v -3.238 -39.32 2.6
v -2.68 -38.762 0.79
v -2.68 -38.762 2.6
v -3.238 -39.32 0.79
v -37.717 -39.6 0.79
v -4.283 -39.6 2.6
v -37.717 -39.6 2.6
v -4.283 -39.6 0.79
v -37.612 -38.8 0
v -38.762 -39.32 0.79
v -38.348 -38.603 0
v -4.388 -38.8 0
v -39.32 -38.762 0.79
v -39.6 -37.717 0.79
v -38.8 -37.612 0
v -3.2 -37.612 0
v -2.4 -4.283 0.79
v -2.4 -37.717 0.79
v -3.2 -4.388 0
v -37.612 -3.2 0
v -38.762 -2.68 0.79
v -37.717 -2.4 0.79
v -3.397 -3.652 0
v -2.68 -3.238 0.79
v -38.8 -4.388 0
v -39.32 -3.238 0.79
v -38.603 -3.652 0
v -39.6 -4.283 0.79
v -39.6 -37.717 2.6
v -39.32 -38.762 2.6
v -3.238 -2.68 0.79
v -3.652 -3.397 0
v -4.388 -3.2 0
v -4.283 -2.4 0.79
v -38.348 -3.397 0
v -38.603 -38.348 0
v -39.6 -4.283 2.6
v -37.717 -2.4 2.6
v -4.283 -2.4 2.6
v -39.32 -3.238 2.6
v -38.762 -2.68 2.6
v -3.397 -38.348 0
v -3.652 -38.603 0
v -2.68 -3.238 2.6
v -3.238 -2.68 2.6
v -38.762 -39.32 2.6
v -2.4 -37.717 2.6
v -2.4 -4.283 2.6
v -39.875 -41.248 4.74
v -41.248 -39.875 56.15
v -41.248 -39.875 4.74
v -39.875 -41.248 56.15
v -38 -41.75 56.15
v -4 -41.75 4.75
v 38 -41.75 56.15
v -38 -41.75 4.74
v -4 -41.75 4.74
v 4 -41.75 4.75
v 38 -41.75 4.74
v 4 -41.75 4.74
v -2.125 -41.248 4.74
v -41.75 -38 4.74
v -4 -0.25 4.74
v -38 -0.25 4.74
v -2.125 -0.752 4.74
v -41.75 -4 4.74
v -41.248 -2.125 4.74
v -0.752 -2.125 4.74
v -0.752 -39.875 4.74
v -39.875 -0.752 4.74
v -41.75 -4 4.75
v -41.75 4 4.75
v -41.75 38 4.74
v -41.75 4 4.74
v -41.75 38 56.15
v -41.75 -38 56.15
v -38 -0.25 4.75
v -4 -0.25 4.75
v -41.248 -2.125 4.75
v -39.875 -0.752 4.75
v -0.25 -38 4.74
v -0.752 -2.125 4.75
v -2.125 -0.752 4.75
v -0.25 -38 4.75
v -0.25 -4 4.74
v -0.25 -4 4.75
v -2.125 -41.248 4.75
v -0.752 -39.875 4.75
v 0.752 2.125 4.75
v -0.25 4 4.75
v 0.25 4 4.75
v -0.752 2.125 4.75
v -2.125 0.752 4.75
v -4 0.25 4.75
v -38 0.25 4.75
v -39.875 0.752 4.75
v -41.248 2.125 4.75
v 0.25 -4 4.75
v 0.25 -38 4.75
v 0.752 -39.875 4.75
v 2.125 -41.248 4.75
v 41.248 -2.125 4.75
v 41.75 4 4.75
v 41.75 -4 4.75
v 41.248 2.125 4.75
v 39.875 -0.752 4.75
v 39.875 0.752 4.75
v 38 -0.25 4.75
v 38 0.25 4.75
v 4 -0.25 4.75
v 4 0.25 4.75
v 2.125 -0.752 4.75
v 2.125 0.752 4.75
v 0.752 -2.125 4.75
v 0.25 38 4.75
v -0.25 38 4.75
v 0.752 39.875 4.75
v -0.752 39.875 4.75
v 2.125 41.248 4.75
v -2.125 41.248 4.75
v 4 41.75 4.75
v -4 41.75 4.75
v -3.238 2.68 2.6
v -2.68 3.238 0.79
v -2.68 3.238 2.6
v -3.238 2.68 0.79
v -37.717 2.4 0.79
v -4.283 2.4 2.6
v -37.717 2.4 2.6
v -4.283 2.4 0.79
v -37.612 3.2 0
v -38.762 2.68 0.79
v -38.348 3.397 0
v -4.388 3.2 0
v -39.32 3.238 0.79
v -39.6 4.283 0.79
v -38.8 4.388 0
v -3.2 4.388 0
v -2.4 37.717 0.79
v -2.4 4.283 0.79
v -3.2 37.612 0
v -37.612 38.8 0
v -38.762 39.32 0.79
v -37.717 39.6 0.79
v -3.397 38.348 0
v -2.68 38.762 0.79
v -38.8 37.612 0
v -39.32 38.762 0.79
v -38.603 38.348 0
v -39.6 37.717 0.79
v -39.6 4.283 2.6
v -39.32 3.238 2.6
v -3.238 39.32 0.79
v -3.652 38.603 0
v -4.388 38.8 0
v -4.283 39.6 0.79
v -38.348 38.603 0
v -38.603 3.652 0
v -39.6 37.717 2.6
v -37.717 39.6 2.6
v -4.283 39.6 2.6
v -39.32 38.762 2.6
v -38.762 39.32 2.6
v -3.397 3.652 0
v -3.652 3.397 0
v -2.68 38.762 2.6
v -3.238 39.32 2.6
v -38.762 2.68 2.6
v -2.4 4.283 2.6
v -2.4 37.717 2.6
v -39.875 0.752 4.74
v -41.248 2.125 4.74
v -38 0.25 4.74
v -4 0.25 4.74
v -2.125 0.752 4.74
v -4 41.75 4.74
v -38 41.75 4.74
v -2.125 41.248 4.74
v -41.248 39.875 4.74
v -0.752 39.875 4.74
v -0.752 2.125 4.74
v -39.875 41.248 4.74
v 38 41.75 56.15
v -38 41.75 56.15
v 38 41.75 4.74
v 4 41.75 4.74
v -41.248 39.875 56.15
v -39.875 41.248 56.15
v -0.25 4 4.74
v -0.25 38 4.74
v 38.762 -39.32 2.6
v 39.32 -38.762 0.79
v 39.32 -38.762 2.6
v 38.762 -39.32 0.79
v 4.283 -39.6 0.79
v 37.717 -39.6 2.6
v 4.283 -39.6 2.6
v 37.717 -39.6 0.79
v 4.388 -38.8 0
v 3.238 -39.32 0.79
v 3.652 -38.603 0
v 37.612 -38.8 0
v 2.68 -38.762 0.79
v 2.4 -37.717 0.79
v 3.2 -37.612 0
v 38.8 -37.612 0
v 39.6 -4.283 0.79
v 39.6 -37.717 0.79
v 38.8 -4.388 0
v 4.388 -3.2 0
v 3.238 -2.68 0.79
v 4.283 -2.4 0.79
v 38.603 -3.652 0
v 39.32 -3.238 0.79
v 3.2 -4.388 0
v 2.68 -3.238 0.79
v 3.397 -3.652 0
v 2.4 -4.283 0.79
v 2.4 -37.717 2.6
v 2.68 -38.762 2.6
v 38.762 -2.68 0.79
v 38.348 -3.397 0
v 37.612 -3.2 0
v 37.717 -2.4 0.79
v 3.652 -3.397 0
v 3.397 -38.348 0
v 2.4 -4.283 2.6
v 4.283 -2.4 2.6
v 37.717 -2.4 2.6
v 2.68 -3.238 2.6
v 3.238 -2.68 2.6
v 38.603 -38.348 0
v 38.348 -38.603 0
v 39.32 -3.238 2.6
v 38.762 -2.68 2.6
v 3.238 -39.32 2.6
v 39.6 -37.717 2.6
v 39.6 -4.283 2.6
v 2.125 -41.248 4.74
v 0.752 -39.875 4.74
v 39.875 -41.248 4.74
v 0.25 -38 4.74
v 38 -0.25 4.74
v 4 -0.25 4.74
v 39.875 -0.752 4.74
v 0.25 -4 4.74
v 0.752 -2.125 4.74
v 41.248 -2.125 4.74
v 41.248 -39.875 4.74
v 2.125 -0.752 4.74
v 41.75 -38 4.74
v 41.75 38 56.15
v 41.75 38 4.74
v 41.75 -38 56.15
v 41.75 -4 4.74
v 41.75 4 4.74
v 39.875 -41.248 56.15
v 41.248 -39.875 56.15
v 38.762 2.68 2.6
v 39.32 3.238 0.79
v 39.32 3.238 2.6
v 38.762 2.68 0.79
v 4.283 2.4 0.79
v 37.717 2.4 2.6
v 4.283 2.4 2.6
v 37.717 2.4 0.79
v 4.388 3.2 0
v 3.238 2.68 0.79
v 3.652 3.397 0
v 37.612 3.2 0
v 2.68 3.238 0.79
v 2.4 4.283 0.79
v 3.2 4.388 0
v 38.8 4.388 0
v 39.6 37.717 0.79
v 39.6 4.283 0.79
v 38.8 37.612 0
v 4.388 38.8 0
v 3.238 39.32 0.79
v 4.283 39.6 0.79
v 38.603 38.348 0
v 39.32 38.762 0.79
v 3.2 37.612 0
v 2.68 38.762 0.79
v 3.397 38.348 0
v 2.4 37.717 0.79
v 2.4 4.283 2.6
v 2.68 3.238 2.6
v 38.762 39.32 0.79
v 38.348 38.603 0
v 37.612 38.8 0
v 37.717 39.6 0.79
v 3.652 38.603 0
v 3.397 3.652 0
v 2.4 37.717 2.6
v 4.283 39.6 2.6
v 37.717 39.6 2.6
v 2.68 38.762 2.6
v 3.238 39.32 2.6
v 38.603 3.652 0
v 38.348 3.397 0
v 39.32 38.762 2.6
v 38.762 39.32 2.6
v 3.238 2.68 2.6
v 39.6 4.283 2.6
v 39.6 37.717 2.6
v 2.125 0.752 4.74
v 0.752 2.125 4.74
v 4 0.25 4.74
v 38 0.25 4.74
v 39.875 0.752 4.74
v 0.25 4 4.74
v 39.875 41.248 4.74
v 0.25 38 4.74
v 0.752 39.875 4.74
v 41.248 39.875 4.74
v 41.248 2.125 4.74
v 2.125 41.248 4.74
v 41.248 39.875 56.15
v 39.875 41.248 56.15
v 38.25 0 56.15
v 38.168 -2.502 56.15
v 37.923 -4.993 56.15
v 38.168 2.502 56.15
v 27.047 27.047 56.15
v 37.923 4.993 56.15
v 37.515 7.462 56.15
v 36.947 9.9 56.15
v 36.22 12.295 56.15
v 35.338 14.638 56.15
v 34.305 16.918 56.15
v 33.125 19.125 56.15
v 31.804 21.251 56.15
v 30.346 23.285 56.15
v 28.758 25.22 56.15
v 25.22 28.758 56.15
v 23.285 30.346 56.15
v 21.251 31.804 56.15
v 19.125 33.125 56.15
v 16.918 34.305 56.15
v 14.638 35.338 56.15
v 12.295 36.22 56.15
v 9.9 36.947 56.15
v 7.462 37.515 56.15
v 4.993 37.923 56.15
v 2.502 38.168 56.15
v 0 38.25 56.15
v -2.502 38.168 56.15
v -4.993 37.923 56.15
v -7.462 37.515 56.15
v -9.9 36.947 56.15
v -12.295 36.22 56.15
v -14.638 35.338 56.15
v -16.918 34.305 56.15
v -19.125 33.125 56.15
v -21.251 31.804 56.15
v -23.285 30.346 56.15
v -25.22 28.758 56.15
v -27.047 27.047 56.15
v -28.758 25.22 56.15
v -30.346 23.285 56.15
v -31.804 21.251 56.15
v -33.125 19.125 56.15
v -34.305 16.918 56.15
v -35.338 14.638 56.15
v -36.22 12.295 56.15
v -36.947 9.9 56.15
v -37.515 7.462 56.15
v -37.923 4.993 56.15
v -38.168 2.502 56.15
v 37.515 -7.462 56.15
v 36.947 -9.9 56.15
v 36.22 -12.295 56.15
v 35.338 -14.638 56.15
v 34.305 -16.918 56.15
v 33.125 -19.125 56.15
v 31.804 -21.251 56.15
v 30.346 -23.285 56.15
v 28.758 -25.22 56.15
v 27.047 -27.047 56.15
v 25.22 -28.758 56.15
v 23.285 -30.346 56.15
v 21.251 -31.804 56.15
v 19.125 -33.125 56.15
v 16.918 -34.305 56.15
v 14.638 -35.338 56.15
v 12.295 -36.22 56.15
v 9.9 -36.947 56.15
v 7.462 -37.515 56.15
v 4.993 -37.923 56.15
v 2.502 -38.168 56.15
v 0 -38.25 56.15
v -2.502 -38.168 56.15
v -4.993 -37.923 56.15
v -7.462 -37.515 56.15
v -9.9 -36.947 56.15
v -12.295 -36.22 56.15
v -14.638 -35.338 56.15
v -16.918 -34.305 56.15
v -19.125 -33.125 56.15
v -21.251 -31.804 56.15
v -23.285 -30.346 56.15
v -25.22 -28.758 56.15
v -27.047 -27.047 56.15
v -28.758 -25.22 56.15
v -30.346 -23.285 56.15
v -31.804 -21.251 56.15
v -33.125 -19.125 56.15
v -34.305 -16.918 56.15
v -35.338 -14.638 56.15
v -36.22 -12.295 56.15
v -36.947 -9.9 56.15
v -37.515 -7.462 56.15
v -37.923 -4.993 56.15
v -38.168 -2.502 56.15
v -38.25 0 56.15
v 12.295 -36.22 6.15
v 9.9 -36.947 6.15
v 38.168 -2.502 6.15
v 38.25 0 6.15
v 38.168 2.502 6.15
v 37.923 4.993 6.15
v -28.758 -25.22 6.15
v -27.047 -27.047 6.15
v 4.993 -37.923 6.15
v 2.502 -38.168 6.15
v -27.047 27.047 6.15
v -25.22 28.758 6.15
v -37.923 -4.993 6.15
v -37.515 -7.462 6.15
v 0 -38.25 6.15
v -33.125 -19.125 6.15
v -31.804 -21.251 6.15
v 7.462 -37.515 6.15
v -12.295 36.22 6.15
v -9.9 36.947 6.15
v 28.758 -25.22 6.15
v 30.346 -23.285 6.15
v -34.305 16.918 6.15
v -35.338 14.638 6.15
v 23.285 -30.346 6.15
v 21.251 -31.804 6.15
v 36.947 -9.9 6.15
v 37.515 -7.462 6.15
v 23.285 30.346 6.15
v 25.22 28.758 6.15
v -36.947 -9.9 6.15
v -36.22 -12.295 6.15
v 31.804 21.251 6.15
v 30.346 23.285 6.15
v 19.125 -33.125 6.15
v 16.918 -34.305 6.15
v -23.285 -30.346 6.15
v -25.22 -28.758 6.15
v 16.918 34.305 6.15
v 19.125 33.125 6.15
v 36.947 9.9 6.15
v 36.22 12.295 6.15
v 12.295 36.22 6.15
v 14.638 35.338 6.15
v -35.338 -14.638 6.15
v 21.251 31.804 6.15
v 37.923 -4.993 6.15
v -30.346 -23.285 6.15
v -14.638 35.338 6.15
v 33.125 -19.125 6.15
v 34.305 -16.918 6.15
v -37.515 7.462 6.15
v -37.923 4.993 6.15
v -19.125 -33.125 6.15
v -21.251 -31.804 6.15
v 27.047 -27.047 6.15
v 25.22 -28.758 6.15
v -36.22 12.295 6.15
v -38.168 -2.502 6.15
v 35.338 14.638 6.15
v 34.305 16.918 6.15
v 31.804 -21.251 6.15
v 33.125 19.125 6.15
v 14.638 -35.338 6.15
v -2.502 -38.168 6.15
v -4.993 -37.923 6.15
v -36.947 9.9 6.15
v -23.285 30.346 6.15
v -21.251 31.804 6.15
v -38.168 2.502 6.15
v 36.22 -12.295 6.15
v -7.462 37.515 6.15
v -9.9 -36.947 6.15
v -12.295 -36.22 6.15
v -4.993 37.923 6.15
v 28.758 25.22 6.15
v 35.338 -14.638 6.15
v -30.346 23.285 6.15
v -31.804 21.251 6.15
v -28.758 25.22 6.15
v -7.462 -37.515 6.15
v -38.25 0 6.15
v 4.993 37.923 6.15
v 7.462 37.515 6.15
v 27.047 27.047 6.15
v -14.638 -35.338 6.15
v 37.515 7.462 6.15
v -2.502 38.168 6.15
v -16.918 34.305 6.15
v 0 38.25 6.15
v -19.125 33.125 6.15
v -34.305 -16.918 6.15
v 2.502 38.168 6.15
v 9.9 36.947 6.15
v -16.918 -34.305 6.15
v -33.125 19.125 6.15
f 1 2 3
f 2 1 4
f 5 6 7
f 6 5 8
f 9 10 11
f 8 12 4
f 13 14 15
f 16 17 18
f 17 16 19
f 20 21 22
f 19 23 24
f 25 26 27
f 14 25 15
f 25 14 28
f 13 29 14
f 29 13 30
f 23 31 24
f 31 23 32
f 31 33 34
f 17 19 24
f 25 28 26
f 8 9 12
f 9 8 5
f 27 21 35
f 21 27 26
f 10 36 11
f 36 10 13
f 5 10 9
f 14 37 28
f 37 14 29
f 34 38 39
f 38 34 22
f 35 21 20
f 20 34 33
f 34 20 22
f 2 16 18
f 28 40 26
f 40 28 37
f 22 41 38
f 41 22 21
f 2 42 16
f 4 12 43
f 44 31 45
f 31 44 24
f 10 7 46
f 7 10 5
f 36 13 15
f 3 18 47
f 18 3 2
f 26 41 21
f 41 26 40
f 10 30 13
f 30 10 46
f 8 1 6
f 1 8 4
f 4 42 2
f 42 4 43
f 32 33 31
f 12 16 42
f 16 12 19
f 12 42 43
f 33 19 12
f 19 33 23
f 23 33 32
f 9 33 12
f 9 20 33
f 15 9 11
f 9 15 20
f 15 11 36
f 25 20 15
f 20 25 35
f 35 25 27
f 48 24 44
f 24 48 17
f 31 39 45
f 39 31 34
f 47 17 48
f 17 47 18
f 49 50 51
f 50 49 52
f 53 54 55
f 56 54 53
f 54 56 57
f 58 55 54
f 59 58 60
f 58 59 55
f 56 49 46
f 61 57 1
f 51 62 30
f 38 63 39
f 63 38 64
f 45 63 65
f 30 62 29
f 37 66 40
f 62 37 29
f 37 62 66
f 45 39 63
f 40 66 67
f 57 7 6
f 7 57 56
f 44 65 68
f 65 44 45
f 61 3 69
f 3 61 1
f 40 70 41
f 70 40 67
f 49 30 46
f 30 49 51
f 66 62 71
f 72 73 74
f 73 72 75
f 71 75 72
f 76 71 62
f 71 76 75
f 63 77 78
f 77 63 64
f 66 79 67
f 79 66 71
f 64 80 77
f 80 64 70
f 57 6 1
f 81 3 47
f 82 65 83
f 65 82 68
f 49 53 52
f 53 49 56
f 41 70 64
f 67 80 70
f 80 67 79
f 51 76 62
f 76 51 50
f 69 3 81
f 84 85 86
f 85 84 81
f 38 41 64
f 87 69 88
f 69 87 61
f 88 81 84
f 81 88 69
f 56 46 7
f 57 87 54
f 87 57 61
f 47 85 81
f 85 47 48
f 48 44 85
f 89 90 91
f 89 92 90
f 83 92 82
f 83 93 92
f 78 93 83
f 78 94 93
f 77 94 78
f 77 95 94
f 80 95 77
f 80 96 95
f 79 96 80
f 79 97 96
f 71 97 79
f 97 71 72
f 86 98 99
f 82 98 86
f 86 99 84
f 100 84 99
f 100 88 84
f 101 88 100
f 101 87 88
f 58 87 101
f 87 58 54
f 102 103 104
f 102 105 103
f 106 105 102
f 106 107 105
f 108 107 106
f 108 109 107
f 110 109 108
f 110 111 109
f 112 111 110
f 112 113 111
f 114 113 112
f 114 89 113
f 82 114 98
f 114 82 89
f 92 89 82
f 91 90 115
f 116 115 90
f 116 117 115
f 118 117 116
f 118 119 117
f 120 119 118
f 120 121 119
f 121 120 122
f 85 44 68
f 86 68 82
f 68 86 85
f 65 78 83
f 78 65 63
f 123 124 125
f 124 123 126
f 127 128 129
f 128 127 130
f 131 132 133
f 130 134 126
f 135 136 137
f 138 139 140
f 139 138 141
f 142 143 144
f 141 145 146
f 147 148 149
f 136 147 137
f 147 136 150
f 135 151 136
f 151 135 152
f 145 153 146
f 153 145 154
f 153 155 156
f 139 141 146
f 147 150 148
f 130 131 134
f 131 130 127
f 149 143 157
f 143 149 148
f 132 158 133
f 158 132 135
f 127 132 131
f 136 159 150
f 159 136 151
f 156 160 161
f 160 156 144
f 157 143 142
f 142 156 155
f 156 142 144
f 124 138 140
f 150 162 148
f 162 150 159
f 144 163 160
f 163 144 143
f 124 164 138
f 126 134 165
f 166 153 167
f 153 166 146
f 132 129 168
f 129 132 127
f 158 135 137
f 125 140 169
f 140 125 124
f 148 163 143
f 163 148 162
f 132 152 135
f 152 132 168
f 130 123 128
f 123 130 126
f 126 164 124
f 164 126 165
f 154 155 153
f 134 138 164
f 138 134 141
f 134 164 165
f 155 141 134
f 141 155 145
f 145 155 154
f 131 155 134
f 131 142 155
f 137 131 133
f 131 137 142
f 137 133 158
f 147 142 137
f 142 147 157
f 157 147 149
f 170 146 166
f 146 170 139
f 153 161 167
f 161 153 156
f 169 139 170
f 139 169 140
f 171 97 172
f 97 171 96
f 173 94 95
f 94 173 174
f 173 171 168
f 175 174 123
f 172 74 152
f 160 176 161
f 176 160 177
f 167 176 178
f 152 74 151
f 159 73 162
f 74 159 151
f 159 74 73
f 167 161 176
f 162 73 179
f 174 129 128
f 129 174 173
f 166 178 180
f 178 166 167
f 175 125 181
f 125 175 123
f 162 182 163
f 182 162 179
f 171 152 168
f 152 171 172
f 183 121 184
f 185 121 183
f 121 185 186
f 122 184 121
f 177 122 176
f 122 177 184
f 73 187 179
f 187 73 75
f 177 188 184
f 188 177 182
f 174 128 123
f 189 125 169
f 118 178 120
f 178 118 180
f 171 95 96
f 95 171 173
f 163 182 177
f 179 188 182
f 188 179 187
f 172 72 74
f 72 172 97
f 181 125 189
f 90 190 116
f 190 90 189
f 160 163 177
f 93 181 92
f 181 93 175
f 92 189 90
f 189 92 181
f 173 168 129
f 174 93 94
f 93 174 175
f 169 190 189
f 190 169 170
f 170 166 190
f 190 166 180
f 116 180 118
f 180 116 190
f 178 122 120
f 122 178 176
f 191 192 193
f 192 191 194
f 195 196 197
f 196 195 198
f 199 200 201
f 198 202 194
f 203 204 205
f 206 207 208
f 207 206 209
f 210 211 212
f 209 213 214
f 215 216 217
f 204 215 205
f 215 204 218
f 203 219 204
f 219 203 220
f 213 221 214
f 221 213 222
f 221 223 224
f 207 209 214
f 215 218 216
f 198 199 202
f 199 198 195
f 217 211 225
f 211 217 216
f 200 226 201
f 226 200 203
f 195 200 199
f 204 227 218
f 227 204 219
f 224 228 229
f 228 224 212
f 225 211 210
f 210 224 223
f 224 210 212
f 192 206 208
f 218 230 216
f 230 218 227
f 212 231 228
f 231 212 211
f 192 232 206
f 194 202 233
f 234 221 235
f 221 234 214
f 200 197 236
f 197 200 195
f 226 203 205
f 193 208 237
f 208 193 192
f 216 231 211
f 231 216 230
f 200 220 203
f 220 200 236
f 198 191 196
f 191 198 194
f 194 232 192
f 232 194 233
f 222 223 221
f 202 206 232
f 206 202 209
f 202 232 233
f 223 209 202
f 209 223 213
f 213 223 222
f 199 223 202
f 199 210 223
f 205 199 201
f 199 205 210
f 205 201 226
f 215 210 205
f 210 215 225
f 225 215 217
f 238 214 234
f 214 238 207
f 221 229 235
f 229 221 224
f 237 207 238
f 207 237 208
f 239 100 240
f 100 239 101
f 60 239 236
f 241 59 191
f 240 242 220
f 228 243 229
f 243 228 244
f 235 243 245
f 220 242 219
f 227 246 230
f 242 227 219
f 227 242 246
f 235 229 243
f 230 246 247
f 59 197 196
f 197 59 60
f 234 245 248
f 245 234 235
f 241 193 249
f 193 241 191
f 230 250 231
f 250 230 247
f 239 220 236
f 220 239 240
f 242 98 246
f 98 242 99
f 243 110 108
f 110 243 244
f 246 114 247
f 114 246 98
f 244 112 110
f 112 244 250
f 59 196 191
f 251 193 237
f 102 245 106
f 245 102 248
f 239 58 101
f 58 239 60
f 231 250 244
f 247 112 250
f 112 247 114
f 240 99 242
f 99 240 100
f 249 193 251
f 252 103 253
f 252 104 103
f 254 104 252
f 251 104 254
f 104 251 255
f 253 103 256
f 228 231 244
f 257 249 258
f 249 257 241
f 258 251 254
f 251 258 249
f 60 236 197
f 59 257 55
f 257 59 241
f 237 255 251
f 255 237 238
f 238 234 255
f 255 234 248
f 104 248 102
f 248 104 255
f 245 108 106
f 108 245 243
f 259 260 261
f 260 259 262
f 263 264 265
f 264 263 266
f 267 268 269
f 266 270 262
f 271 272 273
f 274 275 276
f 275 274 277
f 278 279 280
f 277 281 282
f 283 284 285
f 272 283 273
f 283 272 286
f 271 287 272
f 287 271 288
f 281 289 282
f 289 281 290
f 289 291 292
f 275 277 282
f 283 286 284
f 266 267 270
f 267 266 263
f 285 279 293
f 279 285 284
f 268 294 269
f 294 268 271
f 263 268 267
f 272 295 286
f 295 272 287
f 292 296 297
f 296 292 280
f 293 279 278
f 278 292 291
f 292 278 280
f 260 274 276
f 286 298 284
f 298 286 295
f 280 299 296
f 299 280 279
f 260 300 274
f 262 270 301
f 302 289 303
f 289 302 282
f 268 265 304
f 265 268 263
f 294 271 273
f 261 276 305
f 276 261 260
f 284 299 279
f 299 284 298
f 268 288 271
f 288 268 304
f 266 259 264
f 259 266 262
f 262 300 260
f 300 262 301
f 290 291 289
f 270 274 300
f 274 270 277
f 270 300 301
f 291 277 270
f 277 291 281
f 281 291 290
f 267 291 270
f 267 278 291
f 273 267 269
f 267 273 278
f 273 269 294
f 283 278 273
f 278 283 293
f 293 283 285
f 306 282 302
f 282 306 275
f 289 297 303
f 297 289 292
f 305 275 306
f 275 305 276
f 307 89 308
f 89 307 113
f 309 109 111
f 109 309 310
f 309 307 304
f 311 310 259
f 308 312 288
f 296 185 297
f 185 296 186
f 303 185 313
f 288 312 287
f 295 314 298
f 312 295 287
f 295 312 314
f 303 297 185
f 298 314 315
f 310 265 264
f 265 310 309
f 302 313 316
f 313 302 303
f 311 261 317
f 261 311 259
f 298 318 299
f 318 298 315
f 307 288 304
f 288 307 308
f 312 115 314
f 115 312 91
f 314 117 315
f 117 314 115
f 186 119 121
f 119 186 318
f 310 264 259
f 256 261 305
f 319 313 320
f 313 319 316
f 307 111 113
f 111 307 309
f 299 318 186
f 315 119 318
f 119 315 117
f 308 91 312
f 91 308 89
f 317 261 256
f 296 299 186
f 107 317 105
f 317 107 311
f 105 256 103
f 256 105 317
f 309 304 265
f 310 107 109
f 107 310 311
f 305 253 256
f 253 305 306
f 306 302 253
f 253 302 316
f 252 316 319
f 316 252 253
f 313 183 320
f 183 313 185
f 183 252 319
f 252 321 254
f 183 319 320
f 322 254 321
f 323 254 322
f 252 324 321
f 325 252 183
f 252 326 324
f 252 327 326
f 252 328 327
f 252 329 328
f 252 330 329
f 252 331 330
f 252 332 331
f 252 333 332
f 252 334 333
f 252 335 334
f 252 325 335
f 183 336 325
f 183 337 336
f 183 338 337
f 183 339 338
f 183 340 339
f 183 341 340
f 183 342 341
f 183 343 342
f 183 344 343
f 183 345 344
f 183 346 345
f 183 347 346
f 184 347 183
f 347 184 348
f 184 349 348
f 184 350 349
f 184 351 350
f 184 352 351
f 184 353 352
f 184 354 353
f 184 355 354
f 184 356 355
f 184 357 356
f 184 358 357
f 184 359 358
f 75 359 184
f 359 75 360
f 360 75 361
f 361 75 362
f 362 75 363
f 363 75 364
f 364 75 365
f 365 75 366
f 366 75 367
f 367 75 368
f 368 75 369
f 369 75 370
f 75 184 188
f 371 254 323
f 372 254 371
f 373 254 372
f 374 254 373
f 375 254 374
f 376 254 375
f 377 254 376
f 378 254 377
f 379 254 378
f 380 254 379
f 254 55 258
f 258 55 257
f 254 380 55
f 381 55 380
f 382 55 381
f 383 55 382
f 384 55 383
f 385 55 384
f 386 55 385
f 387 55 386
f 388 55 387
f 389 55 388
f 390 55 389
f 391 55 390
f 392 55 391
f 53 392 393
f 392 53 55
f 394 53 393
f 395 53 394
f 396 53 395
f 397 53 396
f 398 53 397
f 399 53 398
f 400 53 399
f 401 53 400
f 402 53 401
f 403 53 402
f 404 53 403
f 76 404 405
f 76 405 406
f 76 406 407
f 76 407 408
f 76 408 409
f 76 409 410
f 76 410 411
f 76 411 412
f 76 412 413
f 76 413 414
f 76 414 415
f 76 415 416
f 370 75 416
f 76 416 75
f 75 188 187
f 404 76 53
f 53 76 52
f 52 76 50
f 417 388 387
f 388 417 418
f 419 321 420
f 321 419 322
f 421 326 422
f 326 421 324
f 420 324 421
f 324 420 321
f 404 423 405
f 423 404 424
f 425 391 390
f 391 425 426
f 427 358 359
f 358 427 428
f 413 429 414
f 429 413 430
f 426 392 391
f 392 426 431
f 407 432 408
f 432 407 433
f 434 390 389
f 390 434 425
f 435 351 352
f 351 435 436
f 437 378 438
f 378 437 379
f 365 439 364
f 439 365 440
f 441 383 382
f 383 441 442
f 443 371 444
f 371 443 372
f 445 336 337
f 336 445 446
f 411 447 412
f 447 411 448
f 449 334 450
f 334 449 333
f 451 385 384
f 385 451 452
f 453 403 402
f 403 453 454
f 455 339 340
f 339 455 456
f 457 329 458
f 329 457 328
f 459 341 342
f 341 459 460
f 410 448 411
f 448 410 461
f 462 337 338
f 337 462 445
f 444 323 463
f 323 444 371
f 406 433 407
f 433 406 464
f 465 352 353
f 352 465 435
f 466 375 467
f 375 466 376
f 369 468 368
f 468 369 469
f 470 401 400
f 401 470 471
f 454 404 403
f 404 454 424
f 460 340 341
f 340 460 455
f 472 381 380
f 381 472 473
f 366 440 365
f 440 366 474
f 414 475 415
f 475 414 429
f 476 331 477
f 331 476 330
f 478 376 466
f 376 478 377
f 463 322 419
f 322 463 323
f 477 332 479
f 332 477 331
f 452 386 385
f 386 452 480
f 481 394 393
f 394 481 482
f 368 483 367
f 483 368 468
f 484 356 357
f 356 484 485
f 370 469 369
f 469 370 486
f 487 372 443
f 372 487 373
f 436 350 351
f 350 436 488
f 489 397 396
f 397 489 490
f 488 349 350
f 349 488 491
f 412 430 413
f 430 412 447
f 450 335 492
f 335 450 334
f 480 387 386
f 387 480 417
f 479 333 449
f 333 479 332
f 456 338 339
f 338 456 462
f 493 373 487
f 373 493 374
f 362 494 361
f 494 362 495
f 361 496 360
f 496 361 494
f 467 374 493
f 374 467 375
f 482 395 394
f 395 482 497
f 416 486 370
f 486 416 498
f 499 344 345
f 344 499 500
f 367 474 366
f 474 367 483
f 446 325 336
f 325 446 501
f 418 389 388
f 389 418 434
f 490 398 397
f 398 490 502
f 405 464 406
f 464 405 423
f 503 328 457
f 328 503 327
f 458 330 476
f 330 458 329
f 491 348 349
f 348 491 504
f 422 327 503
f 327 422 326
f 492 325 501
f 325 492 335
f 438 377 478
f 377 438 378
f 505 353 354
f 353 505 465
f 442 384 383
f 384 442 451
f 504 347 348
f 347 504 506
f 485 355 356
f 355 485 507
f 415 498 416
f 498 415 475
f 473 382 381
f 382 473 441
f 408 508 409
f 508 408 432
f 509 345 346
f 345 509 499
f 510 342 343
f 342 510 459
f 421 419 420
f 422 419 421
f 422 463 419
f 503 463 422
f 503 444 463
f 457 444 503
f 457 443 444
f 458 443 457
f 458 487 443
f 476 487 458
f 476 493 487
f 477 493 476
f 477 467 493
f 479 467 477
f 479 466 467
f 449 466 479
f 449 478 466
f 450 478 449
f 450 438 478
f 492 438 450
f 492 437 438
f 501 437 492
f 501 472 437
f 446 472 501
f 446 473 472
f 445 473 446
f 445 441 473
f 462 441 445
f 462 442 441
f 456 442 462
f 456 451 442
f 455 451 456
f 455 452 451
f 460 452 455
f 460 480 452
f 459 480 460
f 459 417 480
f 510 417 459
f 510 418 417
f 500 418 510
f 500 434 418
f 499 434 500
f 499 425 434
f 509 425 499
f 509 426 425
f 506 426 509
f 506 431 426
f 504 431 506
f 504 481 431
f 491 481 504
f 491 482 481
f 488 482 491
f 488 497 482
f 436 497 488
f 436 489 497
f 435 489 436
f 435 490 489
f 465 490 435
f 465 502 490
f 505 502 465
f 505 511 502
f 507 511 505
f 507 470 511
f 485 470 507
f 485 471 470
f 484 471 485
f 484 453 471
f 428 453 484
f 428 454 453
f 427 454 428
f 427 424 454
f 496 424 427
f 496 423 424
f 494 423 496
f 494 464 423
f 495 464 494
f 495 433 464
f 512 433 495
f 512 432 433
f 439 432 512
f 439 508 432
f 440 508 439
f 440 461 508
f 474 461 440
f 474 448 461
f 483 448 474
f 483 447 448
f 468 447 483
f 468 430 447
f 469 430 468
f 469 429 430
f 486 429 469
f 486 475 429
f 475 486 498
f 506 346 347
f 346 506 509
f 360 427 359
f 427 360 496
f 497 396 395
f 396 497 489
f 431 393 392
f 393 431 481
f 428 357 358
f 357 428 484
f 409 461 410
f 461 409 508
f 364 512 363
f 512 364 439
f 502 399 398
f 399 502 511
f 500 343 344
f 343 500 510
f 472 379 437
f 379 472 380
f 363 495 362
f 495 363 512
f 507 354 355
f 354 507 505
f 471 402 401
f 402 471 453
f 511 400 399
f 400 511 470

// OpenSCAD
// file: ../lib/vessel.scad
// SPDX-License-Identifier: MIT
// Copyright (c) 2026 Aaron Cupp
//
// vessel.scad — parametric collar cups for bottles, cans, and pen-form tools.
//
// A collar cup is a solid Gridfinity block with cylindrical bores sunk into it.
// It LOCATES a vessel; it does not clamp one. That distinction is the whole
// design: a collar that grips harder than the bin weighs comes out of the
// baseplate with the bottle when you grab it one-handed. Clearance, not
// interference — CLR is per-diameter, not per-side.
//
// Capture depth is roughly a third of the vessel's height. Enough to resist a
// knock (this bench sits under a 180 W fume-extractor intake), not so much that
// you're fishing the bottle out.
//
//   collar_cup(nx, ny, vessel_d, capture_h, …)   — one centred bore
//   collar_cup_multi(nx, ny, bores, capture_h, …) — bores = [[x, y, d], …]
//
// Cord slot: pen-form tools that stand in a cup are usually corded (the HARDELL
// rotary tool takes a barrel jack). Without a slot the lead drapes over the rim
// and levers the tool sideways. `cord_w > 0` cuts a channel from the bore out
// through the wall, open to the top.

include <gridfinity.scad>

CLR      = 1.0;   // bore = vessel_d + CLR. Loose on purpose — see above.
MIN_WALL = 1.2;   // minimum material between two bores, and bore to outer face

// ---- geometry guards ----
// Overlapping bores and bores that break out through the side wall both still
// render as perfectly watertight, 2-manifold meshes — CI cannot tell you the
// part is wrong, only that it is closed. These asserts encode the intent that
// the mesh check can't. Cheap, and they fire at render time rather than on the
// printer.
function _pair_gaps(bores, clr) = [
    for (i = [0 : len(bores)-1], j = [0 : len(bores)-1]) if (i < j)
        norm([bores[i][0]-bores[j][0], bores[i][1]-bores[j][1]])
        - (bores[i][2]+clr)/2 - (bores[j][2]+clr)/2
];
function _edge_gaps(bores, clr, W, D) = [
    for (b = bores) min(W/2 - abs(b[0]) - (b[2]+clr)/2,
                        D/2 - abs(b[1]) - (b[2]+clr)/2)
];

// Multi-bore block. Bores are [x, y, diameter] in mm, relative to the block centre.
module collar_cup_multi(nx, ny, bores, capture_h, floor = 1.4, clr = CLR,
                        cord_w = 0, cord_at = 0, min_wall = MIN_WALL) {
    h = BIN_BASE_H + floor + capture_h;
    e = 0.1;
    W = nx*GF - 0.5; D = ny*GF - 0.5;
    _pg = _pair_gaps(bores, clr);
    _eg = _edge_gaps(bores, clr, W, D);
    assert(len(_pg) == 0 || min(_pg) >= min_wall,
           "collar_cup: bores are too close — they would merge into one pocket");
    assert(min(_eg) >= min_wall,
           "collar_cup: a bore breaches the outer wall — block needs more units");
    difference() {
        bin_blank(nx, ny, h);
        for (b = bores)
            translate([b[0], b[1], BIN_BASE_H + floor])
                cylinder(d = b[2] + clr, h = capture_h + e, $fn = 96);
        // Cord channel: from the first bore outward through the +X wall, open to
        // the rim so the lead drops in from above rather than threading.
        if (cord_w > 0)
            translate([bores[0][0], bores[0][1] - cord_w/2, BIN_BASE_H + floor + cord_at])
                cube([nx*GF, cord_w, h]);
    }
}

// Single centred bore — the common case.
module collar_cup(nx, ny, vessel_d, capture_h, floor = 1.4, clr = CLR,
                  cord_w = 0, cord_at = 0, min_wall = MIN_WALL) {
    collar_cup_multi(nx, ny, [[0, 0, vessel_d]], capture_h, floor, clr,
                     cord_w, cord_at, min_wall);
}

// Evenly spaced row of same-depth bores along X — for a rank of aerosol cans.
// Returns geometry, not a list; pass the diameters and it lays them out on the
// block's centre line.
module collar_cup_row(nx, ny, diameters, capture_h, floor = 1.4, clr = CLR,
                      min_wall = MIN_WALL) {
    n = len(diameters);
    pitch = nx * GF / n;
    collar_cup_multi(nx, ny,
        [for (i = [0 : n-1]) [(i - (n-1)/2) * pitch, 0, diameters[i]]],
        capture_h, floor, clr, 0, 0, min_wall);
}
// file: cleaning_station_common.scad
// cleaning_station_common.scad — shared parameters for the bench cleaning station.
//
// The IPA / contact-cleaner corner of the electronics repair bench. Everything
// here is measured off the actual items with calipers; nothing is a nominal from
// a product page. Diameters carry a per-diameter clearance (lib/vessel.scad CLR),
// not per-side.
//
// This corner sits under a fume-extractor intake, which drives two decisions:
//   * Cups CAPTURE the vessel rather than clamp it — a collar that grips harder
//     than the bin weighs lifts out of the baseplate with the bottle.
//   * Bins stay as low as the job allows. Capture velocity is decided in the
//     first six inches, and a wall of tall bins in front of the hood costs it.
//
// The aerosols are FLAMMABLE and this bench has a 400 °C iron on it. These cups
// are for working cans only; bulk stock belongs away from the hood entirely.
//
// SPDX-License-Identifier: CC-BY-NC-SA-4.0
// Copyright (c) 2026 Aaron Cupp

include <../lib/vessel.scad>

// ---- measured diameters (mm) ----
// DeoxIT bore: taken from the PART, not from a can measurement.
//
// The 2026-08-20 print had three bores — 57.00 / 55.20 / 52.75. The 57.00 fits a
// DeoxIT; 55.20 barely does; 52.75 holds nothing. So 57.00 is a validated bore,
// which beats re-deriving it from a can diameter plus a clearance guess. D5, F5
// and G5 are the same can, so one bore serves all three.
BORE_DEOXIT = 57.00;   // ✅ proven by the printed part

// Freeze spray is a DIFFERENT, LARGER can — 13 mm wider than a DeoxIT, which is
// why it never fitted a shared block.
D_FREEZE_SPRAY = 69.00;   // ✅ measured 2026-08-20 (was 56.00, badly wrong)
FREEZE_CLR     = 2.0;     // [1:0.5:4] -> 71.00 bore
FREEZE_MEASURED = true;

D_DISPENSER    = 53.50;   // 200 ml push-down alcohol pump, square base across flats
D_FLOOD_BOTTLE = 75.50;

// DeoxIT D100 / F100 / G100 concentrate droppers — bare bottles, out of their
// kit boxes. The boxes are a full 2×1 EACH; the three bare bottles share one.
// NOT ROUND — 39 × 20 is a flattened cross-section, not a diameter and a height.
D_DROPPER_L = 39.00;   // measured 2026-08-20, long axis of the footprint
D_DROPPER_W = 20.00;   // measured, short axis
DROPPER_CLR = 1.00;    // per dimension, matching the CLR convention
CAP_DROPPER = 26;      // [8:1:40] capture depth. ⚠️ bottle HEIGHT is unmeasured —
                       //   39 turned out to be a footprint, so the height nobody
                       //   has taken.
                       //   RAISED 15 → 26 on 2026-08-24: at 15 the brushes and
                       //   swabs fell over in their slots. Depth is what resists
                       //   an applicator tipping, and 15 mm of it on a ~100 mm
                       //   brush is almost none. 26 makes the whole block half
                       //   again as tall, which is what was asked for.
                       //   Read the bin_deoxit_droppers header before assuming
                       //   this alone fixes the tipping — it does not.

// ---- melamine sponges (mm) — 3.94 × 2.35 × 0.79 in ----
// Full block as sold. Bulk stock lives in the bag under the desk, ~100 of them;
// none of it competes for grid.
SPONGE_L = 100.1; SPONGE_W = 59.7; SPONGE_T = 20.1;

// WORKING size: a full block is far more sponge than any bench task needs, and
// melamine is consumed by abrasion — quartering one gets four uses out of what
// was one, and the smaller piece reaches between connectors where a 100 mm block
// cannot. Halve across, halve lengthwise.
CUT_L = SPONGE_L / 2;   // 50.05
CUT_W = SPONGE_W / 2;   // 29.85
CUT_T = SPONGE_T;       // 20.1 — unchanged, cuts are through the face

// ---- capture depth ----
// Vessel HEIGHTS were not measured, so this is a judgement call rather than a
// derived third-of-height: 50 mm resists a knock without making the bottles a
// two-handed retrieval. One number to change if the first print feels wrong.
CAPTURE = 50;

// Sponge bin: sponges stand ON EDGE (60 mm tall), ~4 across the 81 mm interior.
// On edge beats flat-stacked — same count in a 68 mm bin instead of a 107 mm one,
// and any sponge can be pinched out rather than peeling off the top of a pile.
// Height is set by a FULL block standing on edge, not a cut one — so one uncut
// block can still ride in the bin as reserve alongside the trimmed pieces.
// Cut pieces are 50 long, which is what lets the footprint drop to 2×2.
SPONGE_BIN_H = SPONGE_W + BIN_BASE_H + 1.4 + 2;   // ≈ 68
// main file
// bin_flood_bottle — 2×2 cup for one Labvida 500 ml IPA wash bottle.
// The tightest cup in the set: 76.5 mm bore in an 83.5 mm block leaves a 3.5 mm
// wall. If a print comes out snug, widen CLR rather than shrinking the bore.
//
// SPDX-License-Identifier: CC-BY-NC-SA-4.0
// Copyright (c) 2026 Aaron Cupp
include <cleaning_station_common.scad>
collar_cup(2, 2, D_FLOOD_BOTTLE, CAPTURE);
